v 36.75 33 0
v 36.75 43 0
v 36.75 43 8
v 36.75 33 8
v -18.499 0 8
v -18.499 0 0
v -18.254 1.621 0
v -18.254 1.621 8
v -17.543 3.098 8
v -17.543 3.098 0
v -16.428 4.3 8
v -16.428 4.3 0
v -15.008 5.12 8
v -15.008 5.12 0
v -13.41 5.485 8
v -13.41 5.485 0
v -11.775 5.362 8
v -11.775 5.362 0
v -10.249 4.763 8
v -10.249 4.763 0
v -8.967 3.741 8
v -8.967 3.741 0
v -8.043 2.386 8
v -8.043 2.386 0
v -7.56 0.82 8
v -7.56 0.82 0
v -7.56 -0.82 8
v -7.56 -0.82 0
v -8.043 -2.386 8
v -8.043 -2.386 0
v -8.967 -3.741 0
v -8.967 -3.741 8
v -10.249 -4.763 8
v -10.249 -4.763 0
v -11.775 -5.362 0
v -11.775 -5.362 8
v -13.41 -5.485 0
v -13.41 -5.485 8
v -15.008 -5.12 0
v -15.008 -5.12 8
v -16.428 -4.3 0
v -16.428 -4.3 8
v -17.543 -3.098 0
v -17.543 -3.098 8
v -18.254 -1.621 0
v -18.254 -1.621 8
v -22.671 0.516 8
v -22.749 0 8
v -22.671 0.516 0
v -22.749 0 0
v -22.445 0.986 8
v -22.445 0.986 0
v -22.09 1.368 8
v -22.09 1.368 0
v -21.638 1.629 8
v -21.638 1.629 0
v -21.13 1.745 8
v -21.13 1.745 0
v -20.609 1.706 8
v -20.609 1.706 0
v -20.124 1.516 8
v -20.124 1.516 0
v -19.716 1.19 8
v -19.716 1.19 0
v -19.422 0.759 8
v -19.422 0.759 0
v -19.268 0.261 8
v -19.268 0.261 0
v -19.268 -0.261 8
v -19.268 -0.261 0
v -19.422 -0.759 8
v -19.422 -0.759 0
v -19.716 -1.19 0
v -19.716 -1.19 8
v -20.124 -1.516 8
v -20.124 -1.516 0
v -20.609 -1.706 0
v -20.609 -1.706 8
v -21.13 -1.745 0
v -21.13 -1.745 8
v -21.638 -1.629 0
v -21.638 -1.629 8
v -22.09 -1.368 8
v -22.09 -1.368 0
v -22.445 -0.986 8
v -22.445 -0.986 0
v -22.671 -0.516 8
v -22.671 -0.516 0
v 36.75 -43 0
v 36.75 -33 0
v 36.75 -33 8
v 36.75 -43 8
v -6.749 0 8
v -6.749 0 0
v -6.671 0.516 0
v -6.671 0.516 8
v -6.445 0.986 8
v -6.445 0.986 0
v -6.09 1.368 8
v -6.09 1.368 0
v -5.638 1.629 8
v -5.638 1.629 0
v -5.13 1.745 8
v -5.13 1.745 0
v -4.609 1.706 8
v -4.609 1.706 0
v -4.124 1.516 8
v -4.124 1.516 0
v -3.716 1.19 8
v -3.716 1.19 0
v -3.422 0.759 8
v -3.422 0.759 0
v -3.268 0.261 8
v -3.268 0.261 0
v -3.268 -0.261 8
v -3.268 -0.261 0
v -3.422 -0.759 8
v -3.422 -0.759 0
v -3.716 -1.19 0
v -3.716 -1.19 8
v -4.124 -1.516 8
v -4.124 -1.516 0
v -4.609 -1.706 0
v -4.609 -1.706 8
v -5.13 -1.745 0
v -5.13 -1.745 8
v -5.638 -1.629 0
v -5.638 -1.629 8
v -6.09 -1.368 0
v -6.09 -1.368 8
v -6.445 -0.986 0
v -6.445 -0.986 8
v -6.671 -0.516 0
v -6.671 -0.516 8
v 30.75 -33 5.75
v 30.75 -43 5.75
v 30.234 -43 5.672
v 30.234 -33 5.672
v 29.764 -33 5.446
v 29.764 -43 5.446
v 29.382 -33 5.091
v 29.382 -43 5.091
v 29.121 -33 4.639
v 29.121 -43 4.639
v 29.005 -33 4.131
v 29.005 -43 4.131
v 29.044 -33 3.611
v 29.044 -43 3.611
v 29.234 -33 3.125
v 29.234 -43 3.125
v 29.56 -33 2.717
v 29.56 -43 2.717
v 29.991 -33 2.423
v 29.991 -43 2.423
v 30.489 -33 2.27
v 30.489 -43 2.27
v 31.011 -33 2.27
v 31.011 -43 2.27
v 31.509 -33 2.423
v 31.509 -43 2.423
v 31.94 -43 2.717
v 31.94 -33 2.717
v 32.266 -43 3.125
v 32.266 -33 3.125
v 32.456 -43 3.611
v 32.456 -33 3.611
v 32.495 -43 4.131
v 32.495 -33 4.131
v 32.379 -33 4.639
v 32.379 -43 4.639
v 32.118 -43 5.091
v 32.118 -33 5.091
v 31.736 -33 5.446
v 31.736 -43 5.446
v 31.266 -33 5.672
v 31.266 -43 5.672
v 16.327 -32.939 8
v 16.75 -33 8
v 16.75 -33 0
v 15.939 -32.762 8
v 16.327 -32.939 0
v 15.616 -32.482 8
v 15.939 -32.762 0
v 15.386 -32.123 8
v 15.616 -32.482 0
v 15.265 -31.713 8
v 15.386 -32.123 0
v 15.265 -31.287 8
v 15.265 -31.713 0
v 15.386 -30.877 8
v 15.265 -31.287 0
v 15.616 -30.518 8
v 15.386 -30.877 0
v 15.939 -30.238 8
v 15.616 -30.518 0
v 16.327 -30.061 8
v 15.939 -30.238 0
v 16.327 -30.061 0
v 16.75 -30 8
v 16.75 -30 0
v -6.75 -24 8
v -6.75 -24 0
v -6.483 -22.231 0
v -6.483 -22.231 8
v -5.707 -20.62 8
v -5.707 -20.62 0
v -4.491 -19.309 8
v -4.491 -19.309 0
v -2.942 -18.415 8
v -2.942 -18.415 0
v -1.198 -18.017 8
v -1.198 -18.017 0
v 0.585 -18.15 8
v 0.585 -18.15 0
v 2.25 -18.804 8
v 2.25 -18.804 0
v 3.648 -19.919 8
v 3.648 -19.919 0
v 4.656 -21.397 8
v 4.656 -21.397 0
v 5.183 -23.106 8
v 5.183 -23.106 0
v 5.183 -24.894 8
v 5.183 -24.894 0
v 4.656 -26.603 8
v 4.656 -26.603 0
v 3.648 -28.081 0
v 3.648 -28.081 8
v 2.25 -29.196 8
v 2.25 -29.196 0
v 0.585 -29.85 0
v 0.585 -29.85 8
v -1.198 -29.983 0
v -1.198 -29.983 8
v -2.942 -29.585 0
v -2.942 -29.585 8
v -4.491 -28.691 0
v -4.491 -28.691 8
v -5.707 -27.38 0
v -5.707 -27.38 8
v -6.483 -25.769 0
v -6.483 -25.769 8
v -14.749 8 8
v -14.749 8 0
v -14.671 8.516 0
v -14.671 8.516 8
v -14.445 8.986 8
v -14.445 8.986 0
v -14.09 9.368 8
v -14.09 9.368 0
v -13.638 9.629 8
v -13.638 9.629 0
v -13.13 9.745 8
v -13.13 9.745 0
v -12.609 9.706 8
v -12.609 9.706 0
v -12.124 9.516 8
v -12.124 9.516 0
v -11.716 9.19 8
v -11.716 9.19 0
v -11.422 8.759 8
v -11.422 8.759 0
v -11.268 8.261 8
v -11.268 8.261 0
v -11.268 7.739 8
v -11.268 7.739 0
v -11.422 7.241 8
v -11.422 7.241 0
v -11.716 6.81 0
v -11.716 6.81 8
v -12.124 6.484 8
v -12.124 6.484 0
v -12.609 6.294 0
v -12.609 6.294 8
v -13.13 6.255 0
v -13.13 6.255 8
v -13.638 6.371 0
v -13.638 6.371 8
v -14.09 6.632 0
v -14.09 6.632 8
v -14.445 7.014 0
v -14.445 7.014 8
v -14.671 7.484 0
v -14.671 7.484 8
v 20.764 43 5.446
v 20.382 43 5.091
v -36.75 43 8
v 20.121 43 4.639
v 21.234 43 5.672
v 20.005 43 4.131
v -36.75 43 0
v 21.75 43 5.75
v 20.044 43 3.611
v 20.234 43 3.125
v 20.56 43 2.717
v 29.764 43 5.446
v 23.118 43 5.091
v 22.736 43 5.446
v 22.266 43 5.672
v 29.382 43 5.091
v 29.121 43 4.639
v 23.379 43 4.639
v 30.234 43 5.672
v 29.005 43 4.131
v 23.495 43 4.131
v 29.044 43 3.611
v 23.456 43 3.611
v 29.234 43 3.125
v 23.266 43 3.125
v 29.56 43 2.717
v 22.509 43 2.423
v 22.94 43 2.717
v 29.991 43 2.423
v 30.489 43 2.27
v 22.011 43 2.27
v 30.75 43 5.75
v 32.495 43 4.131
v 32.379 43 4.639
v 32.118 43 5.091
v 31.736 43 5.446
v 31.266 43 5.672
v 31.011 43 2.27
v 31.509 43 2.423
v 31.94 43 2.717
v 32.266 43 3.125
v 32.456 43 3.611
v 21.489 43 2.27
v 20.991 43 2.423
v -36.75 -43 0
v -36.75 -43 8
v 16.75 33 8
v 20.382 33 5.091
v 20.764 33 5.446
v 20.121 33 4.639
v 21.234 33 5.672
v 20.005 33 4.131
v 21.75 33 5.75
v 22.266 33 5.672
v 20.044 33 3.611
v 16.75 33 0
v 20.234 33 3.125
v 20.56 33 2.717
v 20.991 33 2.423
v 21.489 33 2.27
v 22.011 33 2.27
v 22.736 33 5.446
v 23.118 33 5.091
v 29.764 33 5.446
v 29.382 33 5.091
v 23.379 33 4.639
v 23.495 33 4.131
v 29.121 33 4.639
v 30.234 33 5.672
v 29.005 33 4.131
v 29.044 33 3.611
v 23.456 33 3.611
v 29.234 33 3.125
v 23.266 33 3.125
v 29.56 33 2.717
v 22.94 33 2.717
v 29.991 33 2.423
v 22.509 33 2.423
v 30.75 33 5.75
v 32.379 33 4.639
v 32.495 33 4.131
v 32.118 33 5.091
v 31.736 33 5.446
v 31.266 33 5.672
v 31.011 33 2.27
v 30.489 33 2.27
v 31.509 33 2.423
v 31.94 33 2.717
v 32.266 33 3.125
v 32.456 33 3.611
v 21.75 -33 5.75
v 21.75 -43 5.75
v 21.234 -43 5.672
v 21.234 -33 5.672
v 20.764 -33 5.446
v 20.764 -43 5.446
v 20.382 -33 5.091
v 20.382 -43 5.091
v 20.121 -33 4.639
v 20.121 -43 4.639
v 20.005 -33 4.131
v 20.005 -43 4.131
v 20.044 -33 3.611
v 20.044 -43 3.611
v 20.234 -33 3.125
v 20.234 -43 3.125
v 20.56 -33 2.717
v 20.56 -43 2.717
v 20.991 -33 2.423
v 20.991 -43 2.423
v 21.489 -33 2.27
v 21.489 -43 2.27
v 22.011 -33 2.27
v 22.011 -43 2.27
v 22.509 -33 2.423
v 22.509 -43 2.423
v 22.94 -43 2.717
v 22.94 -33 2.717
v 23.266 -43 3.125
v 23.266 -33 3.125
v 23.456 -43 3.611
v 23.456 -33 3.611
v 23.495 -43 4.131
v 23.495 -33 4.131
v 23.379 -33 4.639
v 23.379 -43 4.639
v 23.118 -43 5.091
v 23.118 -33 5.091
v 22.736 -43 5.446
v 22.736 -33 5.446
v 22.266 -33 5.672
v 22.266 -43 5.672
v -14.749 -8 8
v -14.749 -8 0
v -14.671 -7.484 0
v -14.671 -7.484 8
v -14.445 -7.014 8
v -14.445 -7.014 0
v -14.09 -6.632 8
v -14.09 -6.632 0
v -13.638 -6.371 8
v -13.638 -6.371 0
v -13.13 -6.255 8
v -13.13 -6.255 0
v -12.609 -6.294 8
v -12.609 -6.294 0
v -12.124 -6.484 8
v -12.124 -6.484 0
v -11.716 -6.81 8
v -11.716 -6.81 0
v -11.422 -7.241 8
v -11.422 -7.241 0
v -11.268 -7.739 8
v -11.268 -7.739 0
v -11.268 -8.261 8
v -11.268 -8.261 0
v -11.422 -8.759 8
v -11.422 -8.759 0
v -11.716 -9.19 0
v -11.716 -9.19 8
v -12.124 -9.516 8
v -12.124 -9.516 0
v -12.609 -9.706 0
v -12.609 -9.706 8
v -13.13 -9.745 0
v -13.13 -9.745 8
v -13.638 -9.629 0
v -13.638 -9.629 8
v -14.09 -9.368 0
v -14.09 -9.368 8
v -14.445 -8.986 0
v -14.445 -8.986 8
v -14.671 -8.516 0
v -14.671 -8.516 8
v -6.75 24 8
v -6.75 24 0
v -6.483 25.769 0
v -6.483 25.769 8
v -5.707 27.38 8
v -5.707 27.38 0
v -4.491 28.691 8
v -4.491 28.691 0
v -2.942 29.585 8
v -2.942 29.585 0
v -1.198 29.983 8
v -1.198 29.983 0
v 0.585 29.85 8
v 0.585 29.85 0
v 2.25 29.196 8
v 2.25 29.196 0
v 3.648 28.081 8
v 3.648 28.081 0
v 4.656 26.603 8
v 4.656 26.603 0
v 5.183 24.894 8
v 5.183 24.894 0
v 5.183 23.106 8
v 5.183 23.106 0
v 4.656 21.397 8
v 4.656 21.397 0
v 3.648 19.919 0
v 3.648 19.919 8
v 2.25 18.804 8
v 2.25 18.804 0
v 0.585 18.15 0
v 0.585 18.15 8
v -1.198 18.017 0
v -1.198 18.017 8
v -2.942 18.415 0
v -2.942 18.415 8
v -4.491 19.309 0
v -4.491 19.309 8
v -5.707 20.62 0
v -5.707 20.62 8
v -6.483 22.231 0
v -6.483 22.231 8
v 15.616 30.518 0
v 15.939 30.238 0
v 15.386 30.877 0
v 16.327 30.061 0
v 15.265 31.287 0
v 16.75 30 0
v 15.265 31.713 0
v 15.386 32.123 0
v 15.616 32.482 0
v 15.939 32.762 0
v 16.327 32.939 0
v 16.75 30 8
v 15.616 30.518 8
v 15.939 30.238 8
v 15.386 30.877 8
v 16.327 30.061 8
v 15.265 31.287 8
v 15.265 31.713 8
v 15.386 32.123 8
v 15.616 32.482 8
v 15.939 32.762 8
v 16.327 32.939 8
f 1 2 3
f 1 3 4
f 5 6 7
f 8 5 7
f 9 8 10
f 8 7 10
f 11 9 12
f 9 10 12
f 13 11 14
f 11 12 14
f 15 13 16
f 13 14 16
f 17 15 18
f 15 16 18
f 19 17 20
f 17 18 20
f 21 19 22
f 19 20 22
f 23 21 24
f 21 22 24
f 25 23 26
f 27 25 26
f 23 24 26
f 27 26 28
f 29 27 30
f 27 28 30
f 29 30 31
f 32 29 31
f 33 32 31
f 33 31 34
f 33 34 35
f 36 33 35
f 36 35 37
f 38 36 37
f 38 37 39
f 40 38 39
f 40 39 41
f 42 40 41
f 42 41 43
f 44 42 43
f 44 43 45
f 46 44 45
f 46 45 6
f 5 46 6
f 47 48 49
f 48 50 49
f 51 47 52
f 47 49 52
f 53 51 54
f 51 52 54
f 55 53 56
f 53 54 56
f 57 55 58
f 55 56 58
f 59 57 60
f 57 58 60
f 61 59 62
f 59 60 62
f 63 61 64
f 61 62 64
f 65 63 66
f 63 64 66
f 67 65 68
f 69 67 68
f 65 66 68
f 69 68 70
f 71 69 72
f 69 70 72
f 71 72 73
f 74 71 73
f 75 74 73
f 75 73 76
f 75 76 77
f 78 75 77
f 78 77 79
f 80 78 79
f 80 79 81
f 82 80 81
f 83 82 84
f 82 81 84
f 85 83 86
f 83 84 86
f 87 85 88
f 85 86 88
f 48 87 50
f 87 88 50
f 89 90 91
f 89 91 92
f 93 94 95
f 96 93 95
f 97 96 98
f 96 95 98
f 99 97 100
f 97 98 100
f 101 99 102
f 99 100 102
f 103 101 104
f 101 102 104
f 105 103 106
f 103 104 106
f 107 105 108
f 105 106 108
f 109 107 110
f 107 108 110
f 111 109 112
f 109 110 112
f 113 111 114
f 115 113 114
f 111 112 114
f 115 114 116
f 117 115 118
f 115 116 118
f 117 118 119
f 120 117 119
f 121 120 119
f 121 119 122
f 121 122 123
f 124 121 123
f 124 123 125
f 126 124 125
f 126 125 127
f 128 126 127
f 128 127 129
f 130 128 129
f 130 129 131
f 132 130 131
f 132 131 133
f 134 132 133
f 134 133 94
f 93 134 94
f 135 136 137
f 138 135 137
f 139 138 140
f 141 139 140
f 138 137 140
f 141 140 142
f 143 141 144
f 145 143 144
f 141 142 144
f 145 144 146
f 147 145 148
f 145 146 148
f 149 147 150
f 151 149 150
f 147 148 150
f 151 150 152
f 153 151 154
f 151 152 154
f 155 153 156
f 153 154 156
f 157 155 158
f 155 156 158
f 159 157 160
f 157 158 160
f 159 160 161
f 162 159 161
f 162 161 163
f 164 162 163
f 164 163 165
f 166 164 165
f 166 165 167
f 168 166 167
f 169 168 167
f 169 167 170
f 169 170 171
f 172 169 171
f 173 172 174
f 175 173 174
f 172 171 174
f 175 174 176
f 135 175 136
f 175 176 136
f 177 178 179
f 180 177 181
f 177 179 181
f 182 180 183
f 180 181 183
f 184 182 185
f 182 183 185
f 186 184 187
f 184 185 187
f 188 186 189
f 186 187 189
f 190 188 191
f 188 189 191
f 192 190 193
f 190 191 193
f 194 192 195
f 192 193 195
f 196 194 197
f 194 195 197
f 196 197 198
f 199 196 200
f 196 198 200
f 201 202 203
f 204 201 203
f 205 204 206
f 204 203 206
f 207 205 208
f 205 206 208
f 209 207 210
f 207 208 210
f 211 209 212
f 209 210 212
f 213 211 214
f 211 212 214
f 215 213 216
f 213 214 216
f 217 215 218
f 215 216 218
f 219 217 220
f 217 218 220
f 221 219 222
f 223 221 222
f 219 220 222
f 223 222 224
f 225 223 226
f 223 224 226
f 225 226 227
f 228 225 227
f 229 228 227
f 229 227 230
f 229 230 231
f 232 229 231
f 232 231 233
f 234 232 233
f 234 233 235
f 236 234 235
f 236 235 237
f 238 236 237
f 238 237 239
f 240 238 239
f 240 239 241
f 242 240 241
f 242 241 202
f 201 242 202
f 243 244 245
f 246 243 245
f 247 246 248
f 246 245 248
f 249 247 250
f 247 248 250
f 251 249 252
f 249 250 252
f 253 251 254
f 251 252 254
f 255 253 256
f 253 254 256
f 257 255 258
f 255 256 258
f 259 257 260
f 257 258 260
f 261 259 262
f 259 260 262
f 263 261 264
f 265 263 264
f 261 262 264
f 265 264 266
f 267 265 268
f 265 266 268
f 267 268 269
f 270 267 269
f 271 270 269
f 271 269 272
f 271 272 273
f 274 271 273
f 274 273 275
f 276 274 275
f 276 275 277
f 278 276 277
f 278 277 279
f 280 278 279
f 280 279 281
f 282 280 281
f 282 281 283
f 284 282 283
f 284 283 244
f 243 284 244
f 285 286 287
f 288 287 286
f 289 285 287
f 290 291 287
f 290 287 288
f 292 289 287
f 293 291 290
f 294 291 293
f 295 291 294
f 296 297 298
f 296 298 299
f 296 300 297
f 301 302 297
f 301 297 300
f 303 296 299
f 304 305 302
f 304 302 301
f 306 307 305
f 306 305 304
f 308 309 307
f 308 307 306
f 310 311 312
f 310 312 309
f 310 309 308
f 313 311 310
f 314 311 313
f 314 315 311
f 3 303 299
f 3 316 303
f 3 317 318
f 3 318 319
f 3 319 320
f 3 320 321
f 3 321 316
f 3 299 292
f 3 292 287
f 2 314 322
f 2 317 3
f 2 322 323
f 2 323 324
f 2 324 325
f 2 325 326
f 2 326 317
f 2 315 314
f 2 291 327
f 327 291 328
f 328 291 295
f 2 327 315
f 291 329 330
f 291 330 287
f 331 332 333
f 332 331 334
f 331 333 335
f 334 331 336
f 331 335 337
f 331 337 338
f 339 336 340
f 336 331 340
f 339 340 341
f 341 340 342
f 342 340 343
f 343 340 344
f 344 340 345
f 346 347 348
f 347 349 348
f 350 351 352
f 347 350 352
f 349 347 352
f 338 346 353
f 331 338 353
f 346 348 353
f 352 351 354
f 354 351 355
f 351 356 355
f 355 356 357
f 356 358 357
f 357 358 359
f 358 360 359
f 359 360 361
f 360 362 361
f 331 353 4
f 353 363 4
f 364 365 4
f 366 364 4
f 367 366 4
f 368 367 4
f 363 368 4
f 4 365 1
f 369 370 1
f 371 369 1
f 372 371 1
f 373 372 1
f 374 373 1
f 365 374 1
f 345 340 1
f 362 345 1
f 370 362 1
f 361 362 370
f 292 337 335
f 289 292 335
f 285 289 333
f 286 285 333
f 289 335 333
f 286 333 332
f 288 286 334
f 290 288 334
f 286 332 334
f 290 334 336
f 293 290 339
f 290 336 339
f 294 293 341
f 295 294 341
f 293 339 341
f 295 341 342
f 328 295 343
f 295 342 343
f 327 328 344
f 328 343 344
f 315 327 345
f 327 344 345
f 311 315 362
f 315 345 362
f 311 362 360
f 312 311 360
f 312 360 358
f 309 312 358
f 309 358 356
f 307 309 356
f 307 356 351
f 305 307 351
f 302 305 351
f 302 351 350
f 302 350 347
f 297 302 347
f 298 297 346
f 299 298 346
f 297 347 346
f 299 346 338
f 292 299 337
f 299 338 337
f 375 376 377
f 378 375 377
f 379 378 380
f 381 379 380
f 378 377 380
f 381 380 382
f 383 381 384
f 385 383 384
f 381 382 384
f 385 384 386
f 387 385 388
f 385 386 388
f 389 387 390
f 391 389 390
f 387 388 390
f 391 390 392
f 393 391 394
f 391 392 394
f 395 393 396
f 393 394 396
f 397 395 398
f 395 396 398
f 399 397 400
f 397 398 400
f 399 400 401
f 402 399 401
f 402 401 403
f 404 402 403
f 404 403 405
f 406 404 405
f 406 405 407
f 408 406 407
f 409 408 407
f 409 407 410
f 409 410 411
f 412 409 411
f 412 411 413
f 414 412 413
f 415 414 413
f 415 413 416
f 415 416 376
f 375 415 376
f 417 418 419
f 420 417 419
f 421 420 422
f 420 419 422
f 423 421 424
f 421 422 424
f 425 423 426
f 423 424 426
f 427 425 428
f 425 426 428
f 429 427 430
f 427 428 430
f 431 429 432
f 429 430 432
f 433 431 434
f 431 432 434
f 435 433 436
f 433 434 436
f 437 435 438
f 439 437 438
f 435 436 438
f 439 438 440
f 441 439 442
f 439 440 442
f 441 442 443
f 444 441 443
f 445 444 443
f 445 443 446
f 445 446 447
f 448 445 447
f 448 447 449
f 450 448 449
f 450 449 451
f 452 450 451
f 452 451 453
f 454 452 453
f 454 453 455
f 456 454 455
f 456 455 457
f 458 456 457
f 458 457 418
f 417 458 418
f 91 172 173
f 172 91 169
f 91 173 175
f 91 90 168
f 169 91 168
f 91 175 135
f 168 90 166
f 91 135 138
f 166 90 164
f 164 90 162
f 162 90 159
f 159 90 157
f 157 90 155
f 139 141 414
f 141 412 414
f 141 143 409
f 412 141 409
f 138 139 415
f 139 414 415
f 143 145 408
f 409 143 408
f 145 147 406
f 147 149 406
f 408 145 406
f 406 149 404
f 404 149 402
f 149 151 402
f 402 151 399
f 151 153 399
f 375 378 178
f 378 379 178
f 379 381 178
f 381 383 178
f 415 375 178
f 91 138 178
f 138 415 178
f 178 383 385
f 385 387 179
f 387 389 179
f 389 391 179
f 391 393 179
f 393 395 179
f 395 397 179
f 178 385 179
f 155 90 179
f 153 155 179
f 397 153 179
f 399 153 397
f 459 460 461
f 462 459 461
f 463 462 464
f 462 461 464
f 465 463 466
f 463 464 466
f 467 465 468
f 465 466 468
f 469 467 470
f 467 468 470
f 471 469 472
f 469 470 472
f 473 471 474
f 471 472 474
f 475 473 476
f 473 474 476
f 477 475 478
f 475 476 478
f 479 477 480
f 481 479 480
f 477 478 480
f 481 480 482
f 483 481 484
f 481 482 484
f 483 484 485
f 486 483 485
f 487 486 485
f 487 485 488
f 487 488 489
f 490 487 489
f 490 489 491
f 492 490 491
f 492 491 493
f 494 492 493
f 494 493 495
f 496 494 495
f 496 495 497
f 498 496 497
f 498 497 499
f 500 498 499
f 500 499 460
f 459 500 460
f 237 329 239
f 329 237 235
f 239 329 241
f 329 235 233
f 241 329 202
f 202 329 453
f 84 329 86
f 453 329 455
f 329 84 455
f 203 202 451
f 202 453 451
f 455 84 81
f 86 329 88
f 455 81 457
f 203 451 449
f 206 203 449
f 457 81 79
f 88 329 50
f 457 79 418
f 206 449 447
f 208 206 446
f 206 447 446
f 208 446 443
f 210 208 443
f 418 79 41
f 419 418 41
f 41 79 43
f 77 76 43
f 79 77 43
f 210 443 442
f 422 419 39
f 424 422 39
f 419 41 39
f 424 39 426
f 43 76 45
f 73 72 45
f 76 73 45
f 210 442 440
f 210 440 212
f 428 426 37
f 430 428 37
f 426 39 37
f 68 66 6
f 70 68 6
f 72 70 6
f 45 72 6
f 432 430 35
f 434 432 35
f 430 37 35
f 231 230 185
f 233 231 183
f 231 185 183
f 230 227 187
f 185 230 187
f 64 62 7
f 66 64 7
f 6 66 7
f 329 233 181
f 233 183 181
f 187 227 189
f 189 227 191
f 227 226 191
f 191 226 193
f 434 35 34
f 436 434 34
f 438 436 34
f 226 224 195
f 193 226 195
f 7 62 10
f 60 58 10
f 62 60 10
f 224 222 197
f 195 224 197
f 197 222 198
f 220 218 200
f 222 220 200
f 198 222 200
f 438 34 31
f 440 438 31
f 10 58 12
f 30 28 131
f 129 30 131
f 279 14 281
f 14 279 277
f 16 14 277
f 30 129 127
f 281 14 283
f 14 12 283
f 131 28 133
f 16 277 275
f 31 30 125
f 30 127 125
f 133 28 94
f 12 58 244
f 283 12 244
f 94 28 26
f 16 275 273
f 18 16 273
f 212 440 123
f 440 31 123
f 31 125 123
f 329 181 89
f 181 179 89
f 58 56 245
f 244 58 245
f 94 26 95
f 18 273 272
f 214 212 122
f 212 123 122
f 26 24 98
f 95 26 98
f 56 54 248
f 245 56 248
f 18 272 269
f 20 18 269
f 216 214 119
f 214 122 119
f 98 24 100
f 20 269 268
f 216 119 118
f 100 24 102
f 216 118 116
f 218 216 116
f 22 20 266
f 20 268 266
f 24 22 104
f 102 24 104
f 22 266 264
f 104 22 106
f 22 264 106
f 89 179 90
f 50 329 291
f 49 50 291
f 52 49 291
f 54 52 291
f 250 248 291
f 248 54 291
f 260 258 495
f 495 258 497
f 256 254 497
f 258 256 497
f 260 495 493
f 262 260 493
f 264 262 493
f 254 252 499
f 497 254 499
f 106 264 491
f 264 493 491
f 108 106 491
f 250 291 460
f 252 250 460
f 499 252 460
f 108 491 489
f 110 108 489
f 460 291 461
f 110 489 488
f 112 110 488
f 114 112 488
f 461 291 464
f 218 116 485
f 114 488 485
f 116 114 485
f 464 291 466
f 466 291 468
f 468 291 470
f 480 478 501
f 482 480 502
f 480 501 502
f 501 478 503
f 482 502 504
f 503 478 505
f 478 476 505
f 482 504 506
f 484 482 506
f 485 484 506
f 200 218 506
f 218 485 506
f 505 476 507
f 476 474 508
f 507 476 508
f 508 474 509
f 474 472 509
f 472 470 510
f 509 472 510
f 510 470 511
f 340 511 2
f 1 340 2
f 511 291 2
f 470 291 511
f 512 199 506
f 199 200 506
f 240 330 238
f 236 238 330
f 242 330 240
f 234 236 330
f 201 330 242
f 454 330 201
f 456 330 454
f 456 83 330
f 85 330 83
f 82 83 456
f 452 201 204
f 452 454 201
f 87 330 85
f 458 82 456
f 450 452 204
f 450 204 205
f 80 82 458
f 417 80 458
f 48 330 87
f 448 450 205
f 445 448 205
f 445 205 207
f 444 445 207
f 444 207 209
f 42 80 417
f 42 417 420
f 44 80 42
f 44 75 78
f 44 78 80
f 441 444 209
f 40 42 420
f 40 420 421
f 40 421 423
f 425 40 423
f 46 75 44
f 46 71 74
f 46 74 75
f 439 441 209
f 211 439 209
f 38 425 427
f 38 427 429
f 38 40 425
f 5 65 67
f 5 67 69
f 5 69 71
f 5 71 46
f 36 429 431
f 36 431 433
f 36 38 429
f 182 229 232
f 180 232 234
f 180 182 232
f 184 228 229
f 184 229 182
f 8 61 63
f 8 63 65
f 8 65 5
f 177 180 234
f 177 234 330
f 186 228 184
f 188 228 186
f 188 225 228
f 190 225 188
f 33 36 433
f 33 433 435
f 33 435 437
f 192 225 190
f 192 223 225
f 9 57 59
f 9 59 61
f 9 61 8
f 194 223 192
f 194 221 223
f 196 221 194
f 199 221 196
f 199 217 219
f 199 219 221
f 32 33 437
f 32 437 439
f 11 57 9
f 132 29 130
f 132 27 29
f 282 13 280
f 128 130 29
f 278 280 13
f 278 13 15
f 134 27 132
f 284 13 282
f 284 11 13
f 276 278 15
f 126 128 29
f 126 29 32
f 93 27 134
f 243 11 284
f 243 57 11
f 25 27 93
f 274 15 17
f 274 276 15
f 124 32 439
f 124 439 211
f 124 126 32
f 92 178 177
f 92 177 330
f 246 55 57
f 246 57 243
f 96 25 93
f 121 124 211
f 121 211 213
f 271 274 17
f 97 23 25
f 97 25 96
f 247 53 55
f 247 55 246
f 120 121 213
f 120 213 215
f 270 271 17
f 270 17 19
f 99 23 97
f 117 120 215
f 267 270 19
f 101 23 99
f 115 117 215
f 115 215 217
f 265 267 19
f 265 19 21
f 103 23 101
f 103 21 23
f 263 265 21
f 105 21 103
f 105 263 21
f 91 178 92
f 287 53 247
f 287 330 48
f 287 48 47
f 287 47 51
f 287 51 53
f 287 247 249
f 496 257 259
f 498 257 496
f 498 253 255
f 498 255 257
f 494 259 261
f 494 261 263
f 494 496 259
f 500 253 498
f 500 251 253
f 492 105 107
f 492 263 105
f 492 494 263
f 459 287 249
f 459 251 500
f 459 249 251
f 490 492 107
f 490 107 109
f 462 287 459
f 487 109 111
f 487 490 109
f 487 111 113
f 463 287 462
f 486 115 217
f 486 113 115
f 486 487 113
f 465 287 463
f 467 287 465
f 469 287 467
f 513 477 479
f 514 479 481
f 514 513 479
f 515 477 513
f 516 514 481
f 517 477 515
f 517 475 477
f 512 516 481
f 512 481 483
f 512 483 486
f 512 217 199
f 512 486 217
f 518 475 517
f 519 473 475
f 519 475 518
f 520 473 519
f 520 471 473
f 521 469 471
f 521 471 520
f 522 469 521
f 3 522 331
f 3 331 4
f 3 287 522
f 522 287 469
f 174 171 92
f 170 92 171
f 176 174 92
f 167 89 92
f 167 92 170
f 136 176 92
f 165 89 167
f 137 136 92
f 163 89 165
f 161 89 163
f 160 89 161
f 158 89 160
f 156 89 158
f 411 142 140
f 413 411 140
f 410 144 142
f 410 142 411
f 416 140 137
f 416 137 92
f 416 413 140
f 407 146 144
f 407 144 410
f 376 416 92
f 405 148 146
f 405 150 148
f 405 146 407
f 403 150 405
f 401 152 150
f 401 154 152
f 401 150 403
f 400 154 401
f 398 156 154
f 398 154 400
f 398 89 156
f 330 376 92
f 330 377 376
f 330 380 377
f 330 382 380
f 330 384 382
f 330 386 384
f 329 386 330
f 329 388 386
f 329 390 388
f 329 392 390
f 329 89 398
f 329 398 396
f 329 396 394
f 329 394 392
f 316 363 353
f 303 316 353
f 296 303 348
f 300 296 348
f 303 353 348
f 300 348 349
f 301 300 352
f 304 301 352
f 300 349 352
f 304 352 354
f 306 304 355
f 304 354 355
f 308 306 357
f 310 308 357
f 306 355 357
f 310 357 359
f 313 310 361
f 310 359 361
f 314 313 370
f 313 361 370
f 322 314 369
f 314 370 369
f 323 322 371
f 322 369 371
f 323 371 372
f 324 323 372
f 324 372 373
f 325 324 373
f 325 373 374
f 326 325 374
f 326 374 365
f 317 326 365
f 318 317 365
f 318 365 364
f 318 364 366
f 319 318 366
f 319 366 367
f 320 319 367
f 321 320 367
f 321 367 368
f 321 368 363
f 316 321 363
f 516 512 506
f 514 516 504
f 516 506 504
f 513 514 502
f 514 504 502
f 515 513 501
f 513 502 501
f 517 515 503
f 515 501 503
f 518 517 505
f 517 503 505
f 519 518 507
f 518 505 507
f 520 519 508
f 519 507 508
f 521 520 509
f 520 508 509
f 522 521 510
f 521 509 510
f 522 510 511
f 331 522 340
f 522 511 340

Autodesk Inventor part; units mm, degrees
ref_plane "YZ Plane" through (0, 0, 0) normal (1, 0, 0) x (0, 1, 0)
ref_plane "XZ Plane" through (0, 0, 0) normal (0, 1, 0) x (-1, 0, 0)
ref_plane "XY Plane" through (0, 0, 0) normal (0, 0, 1) x (1, 0, 0)
sketch "Sketch1" plane through (0, 0, 0) normal (0, 0, 1) x (1, 0, 0)
  line L0 (-36.75, 43) -> (36.75, 43)
  line L1 (36.75, 43) -> (36.75, -43)
  line L2 (36.75, -43) -> (-36.75, -43)
  line L3 (-36.75, -43) -> (-36.75, 43)
  point P0 (0, 0)
  point P1 (0, 43)
  point P2 (-36.75, 0)
  dimension "d0" = 73.5
  dimension "d1" = 86
extrude "Extrusion1" add sketch "Sketch1" along normal blind 8
sketch "Sketch4" plane through (0, 0, 0) normal (0, 0, -1) x (-1, 0, 0)
  line L0 (-36.75, -33) -> (-16.75, -33)
  line L1 (-16.75, -33) -> (-16.75, 33)
  line L2 (-16.75, 33) -> (-36.75, 33)
  line L3 (-36.75, 33) -> (-36.75, -33)
  line L4 (-36.75, -43) -> (-36.75, 43) projected
  point P0 (0, 0)
  point P1 (-36.75, 0)
  dimension "d19" = 20
  dimension "d20" = 66
extrude "Extrusion4" cut sketch "Sketch4" against normal blind 10
sketch "Sketch5" plane through (0, 0, 0) normal (0, 0, -1) x (-1, 0, 0)
  circle A0 centre (0.75, -24) radius 6
  circle A1 centre (0.75, 24) radius 6
  line L0 (-8.75, -33) -> (-8.75, 33) projected
  line L1 (-36.75, 33) -> (-36.75, 43) projected
  line L2 (-36.75, 43) -> (36.75, 43) projected
  line L3 (36.75, -43) -> (-36.75, -43) projected
  dimension "d23" = 12
  dimension "d37" = 37.5
  dimension "d38" = 19
  dimension "d39" = 19
extrude "Extrusion5" cut sketch "Sketch5" against normal blind 10
sketch "Sketch6" plane through (0, 0, 0) normal (0, 0, -1) x (-1, 0, 0)
  circle A0 centre (12.9988, 0) radius 11
  circle A1 centre (12.9988, -8) radius 1.75
  circle A2 centre (4.9988, 0) radius 1.75
  circle A3 centre (12.9988, 8) radius 1.75
  circle A4 centre (20.9988, 0) radius 1.75
  circle A5 centre (12.9988, 0) radius 5.5
  circle A6 centre (12.9988, 0) radius 8 construction
  line L0 (36.75, 43) -> (36.75, -43) construction
  line L1 (-36.75, 43) -> (36.75, 43) construction
  point P0 (0, 0)
  dimension "d42" = 3.5
  dimension "d43" = 11
  dimension "d44" = 23.7512
  dimension "d46" = 22
  dimension "d47" = 16
extrude "Extrusion6" cut sketch "Sketch6" against normal blind 10 contours A1 | A2 | A3 | A4 | A5
sketch "Sketch7" plane through (-36.75, 43, 0) normal (0, 1, 0) x (1, 0, 0)
  line L0 (73.5, 0) -> (73.5, -8) projected
  point P0 (36.75, 0)
  point P1 (58.5, -4)
  point P2 (67.5, -4)
  point P3 (73.5, -4)
  dimension "d48" = 9
  dimension "d49" = 6
hole "Hole1" at (21.75, 43, 4) at (30.75, 43, 4) direction (0, -1, 0) diameter 3.5 end through all
sketch "Sketch8" plane through (0, 0, 0) normal (0, 0, -1) x (-1, 0, 0)
  circle A0 centre (-16.75, 31.5) radius 1.5
  circle A1 centre (-16.75, -31.5) radius 1.5
  line L0 (-16.75, 33) -> (-16.75, -33) projected
  line L1 (-36.75, 33) -> (-16.75, 33) projected
  line L2 (-16.75, -33) -> (-36.75, -33) projected
  point P0 (0, 0)
  point P1 (-16.75, -30)
  point P2 (-16.75, 30)
  dimension "d57" = 3
  dimension "d58" = 3
extrude "Extrusion7" cut sketch "Sketch8" against normal through all contours A0 L0 | A1 L0 picked at (-15.9713, 31.7539) picked at (-16.4218, -31.037)
equation "\"d39\" = d38"
properties part number "0005-10-010"
